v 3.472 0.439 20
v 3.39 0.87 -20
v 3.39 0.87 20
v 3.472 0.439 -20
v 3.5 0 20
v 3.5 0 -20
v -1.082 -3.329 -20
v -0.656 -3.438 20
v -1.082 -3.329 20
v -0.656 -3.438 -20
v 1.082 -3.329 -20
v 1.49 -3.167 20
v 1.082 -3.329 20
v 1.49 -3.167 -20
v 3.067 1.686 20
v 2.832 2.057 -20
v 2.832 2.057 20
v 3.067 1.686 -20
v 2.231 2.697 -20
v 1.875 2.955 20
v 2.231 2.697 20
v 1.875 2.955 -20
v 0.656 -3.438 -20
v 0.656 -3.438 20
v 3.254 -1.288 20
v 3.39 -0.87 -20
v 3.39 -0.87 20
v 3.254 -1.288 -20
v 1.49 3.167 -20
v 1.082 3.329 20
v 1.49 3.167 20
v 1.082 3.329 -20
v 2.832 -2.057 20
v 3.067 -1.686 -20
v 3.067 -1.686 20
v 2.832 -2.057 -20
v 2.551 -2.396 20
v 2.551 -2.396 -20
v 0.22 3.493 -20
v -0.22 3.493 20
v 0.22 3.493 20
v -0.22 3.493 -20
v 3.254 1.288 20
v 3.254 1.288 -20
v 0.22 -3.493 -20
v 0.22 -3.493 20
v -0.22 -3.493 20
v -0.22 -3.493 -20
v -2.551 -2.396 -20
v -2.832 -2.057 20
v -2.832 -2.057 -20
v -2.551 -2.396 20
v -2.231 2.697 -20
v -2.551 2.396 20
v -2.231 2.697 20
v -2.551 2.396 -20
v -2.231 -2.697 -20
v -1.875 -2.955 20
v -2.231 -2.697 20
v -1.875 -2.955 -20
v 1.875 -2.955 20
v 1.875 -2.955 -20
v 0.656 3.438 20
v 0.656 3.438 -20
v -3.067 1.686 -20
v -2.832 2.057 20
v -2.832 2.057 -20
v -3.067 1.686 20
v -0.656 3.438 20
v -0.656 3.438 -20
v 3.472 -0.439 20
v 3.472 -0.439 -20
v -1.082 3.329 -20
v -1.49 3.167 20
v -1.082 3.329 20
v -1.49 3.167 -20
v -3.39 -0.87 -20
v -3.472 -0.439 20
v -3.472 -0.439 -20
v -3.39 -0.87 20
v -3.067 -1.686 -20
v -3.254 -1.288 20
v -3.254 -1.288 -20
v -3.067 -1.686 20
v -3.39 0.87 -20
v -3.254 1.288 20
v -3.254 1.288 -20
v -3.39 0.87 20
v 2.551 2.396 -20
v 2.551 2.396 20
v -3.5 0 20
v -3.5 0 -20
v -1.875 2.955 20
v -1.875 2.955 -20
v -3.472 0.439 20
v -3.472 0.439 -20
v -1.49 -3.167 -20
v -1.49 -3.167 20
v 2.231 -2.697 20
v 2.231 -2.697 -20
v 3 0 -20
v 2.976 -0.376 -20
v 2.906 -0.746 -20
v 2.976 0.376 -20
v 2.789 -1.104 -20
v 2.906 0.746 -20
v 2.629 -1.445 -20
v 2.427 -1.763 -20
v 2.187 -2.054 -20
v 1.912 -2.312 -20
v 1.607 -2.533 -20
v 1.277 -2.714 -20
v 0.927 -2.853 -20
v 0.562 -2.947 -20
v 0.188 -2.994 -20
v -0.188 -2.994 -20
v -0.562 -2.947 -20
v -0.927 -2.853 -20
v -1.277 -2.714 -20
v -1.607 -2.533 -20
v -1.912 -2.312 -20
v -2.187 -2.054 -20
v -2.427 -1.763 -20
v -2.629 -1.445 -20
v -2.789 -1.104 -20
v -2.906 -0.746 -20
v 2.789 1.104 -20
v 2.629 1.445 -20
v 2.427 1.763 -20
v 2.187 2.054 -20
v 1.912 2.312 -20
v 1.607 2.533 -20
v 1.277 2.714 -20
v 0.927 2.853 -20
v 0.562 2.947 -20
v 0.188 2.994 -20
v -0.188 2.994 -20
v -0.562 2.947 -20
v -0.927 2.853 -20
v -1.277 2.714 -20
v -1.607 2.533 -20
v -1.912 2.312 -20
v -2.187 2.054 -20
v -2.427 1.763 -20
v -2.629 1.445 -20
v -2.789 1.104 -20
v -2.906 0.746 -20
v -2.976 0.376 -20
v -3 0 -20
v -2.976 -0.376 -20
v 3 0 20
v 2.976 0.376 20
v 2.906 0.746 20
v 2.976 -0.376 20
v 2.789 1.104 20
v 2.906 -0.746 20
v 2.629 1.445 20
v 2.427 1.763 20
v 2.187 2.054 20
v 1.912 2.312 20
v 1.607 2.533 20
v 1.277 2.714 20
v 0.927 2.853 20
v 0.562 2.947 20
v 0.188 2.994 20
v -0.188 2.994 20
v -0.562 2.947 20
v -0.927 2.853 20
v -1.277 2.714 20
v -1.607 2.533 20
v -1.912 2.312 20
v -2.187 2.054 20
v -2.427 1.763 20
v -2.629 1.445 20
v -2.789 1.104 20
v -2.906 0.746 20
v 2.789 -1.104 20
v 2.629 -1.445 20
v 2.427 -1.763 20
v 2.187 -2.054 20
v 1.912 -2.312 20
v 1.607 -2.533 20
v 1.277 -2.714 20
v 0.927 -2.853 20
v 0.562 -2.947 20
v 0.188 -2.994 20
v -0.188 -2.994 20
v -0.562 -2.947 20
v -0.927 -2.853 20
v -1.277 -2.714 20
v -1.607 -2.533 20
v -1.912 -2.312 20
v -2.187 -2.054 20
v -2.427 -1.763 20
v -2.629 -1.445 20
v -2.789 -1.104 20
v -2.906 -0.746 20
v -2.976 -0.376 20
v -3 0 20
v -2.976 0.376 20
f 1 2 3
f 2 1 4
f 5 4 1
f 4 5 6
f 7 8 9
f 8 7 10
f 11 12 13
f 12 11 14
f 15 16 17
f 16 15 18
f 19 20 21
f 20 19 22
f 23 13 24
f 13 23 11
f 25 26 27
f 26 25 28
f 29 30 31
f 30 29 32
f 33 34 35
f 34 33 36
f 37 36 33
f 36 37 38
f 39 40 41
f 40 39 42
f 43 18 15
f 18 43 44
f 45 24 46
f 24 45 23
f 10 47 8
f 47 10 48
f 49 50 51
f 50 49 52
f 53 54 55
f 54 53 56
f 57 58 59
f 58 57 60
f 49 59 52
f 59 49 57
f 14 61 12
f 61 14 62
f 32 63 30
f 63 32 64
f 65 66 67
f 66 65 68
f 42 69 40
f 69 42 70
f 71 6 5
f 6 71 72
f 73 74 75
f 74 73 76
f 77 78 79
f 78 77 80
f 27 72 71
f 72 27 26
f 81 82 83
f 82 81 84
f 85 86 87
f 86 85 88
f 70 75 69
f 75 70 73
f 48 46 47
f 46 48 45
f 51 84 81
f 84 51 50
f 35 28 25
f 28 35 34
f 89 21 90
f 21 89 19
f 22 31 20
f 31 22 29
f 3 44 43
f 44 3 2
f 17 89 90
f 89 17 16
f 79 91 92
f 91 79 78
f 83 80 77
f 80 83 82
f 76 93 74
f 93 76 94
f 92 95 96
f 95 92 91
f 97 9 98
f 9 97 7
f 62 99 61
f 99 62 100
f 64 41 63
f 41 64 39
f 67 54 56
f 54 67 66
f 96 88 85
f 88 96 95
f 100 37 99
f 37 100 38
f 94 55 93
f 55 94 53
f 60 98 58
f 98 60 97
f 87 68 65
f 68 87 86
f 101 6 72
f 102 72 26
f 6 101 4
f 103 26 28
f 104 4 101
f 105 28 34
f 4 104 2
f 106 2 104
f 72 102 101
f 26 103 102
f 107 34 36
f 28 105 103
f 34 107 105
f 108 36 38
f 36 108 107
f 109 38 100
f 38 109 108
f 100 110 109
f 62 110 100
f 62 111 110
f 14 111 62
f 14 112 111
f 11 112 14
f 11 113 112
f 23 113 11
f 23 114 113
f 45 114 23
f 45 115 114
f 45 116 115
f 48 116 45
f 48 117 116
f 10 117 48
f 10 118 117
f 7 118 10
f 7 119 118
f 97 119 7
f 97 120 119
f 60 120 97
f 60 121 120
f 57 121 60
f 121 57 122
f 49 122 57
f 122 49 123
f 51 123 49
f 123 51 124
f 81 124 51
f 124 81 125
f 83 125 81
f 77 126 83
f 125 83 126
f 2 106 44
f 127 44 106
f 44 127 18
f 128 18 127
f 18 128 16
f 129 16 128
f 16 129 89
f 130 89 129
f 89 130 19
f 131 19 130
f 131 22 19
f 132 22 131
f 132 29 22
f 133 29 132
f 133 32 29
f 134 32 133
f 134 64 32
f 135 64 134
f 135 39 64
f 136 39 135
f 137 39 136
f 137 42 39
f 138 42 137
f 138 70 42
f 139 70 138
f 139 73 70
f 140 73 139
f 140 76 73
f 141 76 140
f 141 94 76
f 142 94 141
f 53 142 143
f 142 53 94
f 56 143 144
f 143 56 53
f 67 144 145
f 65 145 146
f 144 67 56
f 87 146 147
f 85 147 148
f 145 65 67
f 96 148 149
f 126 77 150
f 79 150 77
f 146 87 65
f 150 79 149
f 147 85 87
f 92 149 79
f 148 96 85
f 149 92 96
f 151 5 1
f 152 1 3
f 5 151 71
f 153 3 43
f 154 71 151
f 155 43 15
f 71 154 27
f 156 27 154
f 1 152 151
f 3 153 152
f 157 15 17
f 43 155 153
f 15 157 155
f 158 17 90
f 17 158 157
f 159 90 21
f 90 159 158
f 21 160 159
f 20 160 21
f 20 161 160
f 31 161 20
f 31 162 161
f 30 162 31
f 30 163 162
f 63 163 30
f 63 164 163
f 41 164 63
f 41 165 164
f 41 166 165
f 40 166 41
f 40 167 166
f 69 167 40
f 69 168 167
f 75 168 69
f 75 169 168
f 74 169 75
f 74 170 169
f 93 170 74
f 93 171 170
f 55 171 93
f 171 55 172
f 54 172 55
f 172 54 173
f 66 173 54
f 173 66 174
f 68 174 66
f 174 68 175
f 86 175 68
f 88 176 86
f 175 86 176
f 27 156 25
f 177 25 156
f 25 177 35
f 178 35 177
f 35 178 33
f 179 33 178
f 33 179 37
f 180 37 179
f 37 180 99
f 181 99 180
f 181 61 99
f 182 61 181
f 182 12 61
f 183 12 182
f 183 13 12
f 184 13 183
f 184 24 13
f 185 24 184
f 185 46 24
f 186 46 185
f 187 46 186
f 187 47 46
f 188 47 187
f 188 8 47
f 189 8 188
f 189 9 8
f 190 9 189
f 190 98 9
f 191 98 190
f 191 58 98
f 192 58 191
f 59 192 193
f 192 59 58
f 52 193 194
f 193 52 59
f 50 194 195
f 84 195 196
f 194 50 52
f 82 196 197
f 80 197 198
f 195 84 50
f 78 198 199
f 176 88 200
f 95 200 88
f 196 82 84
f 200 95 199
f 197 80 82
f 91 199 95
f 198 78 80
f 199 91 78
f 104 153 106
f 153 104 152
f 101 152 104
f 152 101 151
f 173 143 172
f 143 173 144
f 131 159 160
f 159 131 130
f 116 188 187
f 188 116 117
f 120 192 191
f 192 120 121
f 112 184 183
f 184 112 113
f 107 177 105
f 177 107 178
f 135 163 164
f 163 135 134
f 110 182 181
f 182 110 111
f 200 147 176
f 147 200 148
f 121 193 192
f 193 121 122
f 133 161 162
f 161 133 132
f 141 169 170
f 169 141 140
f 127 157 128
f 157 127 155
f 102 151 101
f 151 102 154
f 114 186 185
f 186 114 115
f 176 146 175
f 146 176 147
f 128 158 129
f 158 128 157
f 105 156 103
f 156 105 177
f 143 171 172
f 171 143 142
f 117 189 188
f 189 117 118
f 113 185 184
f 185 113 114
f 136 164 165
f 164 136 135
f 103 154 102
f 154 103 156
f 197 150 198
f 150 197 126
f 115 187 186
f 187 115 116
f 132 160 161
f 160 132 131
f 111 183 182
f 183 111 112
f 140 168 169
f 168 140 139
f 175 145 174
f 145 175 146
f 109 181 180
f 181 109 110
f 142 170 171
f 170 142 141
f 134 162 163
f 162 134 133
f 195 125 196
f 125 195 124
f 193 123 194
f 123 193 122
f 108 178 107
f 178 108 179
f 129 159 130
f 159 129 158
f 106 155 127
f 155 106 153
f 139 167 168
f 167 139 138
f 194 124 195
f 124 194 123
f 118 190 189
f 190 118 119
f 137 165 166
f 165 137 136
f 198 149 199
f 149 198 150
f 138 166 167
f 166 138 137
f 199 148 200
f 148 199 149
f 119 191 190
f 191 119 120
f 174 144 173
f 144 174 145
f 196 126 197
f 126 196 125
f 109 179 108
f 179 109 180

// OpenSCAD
$fn = 50;


difference() {
	union() {
		translate(v = [0, 0, -20.0000000000]) {
			cylinder(h = 40, r = 3.5000000000);
		}
	}
	union() {
		translate(v = [0, 0, -100.0000000000]) {
			cylinder(h = 200, r = 3.0000000000);
		}
	}
}
